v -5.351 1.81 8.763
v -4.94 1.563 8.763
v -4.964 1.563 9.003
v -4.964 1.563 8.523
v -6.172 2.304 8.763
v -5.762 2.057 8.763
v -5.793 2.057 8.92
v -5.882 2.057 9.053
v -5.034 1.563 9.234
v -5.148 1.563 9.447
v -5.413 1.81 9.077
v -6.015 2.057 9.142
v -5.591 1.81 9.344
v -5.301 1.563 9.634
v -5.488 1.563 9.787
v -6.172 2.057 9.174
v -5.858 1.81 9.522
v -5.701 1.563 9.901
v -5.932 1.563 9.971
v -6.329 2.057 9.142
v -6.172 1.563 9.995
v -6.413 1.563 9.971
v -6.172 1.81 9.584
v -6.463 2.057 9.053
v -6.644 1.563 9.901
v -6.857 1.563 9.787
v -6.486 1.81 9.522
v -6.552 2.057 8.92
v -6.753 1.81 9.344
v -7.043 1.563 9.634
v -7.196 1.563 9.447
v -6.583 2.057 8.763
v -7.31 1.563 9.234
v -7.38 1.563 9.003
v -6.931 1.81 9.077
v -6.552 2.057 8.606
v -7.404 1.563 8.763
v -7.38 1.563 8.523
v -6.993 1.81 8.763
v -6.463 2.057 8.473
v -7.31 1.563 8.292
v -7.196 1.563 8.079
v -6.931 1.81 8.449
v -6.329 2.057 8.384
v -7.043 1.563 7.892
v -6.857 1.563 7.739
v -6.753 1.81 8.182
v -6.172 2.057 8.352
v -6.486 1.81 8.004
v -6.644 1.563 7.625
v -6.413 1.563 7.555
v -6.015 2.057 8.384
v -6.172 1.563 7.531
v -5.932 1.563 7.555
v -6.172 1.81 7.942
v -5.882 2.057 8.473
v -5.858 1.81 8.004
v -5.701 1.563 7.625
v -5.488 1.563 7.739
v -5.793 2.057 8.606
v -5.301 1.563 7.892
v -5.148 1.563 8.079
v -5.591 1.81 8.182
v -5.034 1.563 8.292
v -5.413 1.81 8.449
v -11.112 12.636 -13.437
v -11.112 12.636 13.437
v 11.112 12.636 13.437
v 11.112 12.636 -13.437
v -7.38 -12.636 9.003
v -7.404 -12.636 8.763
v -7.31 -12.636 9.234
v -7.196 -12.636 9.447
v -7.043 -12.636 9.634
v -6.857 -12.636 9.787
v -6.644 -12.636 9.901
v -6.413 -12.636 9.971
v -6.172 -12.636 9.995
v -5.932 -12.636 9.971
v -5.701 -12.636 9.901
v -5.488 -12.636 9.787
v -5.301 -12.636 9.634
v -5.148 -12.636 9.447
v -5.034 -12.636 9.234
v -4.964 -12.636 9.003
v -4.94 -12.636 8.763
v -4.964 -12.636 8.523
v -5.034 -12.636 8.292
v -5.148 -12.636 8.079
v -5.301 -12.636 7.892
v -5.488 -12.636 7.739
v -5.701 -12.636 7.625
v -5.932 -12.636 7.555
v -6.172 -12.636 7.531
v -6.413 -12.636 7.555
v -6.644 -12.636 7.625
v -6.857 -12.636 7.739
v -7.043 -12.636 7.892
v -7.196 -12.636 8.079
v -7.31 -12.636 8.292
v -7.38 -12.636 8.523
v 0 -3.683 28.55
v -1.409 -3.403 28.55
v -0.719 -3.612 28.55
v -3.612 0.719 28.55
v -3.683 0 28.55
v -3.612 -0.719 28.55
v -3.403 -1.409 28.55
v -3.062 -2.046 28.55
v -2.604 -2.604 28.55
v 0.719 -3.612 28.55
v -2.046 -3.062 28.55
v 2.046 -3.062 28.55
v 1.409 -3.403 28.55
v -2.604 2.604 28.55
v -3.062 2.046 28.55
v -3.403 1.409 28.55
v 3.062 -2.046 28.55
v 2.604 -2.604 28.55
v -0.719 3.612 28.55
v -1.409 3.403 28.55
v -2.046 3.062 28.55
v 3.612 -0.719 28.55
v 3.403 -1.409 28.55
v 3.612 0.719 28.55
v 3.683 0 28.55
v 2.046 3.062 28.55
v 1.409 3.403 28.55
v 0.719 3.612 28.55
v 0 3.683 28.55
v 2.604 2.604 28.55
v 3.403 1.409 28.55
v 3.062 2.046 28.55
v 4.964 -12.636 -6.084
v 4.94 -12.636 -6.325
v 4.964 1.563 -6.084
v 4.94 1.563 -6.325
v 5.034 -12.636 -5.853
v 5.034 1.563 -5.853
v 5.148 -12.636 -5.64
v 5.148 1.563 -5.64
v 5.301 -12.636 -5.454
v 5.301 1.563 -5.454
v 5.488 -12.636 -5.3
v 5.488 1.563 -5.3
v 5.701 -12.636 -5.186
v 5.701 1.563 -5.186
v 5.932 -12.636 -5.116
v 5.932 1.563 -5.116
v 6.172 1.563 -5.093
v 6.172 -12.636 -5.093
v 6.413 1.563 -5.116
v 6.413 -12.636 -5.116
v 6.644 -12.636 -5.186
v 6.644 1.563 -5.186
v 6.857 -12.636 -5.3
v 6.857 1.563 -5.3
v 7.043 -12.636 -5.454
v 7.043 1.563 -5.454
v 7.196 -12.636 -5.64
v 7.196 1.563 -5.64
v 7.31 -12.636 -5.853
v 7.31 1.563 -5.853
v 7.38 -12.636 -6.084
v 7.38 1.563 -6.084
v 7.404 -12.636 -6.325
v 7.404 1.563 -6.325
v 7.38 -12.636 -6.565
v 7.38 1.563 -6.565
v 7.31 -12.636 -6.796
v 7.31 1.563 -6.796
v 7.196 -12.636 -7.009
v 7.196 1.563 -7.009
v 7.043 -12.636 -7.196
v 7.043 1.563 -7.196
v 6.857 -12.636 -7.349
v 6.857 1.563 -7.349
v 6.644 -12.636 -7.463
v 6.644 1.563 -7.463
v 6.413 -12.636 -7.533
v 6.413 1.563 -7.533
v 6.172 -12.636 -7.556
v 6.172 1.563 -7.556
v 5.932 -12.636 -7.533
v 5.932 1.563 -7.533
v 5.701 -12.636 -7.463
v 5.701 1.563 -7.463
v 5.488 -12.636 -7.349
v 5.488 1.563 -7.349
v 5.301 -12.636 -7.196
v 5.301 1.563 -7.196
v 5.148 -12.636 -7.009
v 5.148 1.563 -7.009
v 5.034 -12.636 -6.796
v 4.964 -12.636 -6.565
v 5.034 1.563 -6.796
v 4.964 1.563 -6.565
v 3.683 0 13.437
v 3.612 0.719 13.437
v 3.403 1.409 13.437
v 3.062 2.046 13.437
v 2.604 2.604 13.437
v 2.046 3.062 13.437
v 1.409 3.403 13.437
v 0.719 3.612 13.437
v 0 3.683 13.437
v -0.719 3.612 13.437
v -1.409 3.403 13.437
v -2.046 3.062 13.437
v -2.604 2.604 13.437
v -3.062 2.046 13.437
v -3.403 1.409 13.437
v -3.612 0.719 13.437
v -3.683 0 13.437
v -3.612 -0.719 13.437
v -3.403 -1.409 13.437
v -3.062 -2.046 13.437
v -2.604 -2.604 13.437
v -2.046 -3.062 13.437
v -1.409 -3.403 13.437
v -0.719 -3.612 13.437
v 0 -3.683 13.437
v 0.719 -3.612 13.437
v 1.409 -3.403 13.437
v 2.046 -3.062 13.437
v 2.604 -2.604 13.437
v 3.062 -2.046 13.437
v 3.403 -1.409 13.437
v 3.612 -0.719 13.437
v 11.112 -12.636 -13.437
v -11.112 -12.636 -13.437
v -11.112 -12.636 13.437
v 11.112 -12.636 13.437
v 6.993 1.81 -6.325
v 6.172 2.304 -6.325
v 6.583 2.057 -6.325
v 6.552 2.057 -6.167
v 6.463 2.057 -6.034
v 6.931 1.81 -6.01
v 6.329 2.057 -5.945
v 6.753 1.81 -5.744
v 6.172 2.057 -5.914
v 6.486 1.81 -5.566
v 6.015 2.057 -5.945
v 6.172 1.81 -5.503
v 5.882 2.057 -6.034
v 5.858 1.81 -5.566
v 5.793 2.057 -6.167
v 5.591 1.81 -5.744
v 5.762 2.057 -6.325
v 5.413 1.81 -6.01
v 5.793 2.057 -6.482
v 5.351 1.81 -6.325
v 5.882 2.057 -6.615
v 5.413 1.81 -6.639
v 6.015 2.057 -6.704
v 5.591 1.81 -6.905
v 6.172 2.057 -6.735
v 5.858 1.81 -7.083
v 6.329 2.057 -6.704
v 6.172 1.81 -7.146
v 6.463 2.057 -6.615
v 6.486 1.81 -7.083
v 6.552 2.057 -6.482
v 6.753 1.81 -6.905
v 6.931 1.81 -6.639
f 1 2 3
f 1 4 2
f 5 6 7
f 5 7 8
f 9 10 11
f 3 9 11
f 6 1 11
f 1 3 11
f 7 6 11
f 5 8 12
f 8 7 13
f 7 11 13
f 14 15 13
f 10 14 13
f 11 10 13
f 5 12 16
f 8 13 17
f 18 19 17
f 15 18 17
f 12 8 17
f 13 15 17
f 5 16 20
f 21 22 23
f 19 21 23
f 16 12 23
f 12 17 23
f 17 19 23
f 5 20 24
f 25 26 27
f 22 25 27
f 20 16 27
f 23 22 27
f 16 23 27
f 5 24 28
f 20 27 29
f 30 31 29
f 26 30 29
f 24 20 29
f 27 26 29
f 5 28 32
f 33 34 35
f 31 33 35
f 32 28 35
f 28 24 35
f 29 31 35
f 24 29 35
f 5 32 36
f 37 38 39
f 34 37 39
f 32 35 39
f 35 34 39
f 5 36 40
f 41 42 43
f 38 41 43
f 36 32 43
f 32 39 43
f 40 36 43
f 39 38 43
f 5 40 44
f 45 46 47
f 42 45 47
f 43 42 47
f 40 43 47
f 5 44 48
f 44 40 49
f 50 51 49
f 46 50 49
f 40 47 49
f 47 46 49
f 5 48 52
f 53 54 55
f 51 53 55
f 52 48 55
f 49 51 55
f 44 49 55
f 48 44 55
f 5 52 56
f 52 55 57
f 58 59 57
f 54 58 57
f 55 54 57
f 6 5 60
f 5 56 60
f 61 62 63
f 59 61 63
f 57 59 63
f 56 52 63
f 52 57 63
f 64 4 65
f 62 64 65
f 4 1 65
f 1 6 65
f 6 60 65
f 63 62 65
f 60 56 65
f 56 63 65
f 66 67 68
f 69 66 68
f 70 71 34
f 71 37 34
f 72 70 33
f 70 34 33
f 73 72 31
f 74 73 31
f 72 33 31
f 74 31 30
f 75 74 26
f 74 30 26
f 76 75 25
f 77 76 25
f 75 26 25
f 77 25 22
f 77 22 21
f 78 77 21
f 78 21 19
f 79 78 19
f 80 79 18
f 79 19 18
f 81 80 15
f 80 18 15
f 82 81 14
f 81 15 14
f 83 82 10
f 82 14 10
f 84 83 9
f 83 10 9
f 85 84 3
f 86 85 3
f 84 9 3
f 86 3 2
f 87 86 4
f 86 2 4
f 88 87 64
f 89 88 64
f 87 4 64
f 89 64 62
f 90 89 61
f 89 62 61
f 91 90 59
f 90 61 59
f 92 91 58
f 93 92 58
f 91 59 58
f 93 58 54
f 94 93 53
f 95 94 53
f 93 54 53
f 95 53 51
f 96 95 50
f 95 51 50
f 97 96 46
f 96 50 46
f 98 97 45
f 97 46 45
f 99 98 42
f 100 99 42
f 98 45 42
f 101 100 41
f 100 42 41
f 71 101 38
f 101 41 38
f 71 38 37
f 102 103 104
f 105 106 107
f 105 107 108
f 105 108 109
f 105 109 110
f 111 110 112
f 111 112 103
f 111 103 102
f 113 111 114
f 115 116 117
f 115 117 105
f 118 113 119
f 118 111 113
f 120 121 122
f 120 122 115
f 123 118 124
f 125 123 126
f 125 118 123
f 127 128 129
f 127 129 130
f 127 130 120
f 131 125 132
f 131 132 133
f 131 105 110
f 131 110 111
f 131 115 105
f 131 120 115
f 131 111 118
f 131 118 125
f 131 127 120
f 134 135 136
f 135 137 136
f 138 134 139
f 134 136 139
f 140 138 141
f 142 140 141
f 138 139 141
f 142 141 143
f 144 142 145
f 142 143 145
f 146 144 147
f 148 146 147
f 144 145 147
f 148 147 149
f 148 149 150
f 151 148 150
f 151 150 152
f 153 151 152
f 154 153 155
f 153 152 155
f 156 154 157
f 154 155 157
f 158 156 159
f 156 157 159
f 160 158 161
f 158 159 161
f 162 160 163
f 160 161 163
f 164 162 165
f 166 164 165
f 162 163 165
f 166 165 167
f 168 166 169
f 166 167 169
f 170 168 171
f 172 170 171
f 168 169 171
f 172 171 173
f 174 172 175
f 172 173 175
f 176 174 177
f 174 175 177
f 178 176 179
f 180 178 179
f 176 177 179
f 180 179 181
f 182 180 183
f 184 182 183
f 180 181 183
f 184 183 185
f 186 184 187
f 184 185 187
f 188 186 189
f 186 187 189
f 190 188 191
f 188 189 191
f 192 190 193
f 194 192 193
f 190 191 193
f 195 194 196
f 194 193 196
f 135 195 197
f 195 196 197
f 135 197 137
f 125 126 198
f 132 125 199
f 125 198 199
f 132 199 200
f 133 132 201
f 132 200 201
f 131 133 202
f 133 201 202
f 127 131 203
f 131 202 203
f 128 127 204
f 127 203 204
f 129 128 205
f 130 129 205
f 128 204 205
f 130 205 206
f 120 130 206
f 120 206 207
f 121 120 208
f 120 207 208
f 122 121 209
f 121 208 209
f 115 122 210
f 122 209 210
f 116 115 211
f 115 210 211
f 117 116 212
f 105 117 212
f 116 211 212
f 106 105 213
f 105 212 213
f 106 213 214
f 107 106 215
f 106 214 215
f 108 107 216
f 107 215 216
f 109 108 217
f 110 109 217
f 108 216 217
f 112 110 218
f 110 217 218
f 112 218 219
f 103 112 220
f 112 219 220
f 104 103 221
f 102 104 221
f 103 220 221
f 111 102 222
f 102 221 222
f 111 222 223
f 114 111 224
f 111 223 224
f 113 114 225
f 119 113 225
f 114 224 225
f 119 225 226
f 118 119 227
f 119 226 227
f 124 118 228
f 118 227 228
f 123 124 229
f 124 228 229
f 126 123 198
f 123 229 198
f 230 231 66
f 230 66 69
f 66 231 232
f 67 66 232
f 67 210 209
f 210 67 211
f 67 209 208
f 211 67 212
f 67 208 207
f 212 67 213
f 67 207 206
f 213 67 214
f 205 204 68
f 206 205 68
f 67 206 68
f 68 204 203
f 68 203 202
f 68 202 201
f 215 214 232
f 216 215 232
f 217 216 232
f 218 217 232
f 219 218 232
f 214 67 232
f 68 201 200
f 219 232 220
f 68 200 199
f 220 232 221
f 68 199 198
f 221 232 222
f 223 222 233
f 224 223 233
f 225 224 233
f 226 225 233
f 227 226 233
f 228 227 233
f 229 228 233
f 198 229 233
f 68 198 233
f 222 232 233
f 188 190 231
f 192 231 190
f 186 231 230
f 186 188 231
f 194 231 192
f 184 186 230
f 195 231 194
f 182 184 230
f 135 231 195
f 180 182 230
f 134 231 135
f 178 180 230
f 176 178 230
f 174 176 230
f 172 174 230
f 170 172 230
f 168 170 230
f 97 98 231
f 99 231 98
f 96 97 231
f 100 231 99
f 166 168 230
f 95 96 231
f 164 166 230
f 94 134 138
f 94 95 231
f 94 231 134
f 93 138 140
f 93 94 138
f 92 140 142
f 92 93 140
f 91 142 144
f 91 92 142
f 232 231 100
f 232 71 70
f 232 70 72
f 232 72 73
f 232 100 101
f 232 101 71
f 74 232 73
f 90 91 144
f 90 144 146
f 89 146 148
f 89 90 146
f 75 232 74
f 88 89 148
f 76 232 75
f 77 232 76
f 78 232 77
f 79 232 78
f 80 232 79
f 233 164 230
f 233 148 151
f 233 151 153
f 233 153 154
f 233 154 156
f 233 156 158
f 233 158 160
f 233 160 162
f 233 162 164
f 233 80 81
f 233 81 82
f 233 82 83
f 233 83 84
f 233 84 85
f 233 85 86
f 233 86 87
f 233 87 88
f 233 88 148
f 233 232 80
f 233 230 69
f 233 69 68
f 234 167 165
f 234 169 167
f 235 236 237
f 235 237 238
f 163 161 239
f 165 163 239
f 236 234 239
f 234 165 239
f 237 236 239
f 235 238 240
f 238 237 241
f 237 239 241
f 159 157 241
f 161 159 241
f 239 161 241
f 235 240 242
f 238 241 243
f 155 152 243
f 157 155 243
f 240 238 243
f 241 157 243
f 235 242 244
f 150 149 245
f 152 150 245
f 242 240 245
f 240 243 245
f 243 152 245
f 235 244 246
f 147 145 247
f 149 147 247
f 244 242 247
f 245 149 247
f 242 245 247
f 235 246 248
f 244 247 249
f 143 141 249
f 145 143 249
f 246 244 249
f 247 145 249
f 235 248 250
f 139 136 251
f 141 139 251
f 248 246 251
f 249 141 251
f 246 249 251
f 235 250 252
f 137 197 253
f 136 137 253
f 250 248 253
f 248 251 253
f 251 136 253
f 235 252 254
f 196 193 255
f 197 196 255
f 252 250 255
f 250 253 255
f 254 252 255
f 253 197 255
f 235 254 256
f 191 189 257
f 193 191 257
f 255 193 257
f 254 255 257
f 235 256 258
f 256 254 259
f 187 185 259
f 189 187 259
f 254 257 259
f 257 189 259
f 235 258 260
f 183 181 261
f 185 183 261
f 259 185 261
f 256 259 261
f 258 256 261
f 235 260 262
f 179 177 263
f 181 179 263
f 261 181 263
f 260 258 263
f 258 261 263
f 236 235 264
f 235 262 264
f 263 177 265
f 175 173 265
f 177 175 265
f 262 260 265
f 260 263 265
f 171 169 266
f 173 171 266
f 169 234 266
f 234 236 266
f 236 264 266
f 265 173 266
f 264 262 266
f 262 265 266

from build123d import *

# Parameters (mm, degrees)
F0_W     = 22.225
F0_H     = 26.8732
F1_DEPTH = 12.6365
F2_R     = 3.683
F3_DEPTH = 15.113
F5_D     = 2.4638
F5_DEPTH = 14.2
F5_TIP   = 0.7402001966


with BuildPart() as f1:
    # F0 (on Front) → F1 (new body, symmetric)
    with BuildSketch(Plane.XZ):
        Rectangle(F0_W, F0_H)
    extrude(amount=F1_DEPTH, both=True)

    # F2 (on face) → F3 (join)
    with BuildSketch(Plane.XY.offset(13.4366)):
        Circle(F2_R)
    extrude(amount=F3_DEPTH)

    # F5
    with Locations(Plane.XZ.offset(12.6365)):
        with Locations((-6.1722, 8.763), (6.1722, -6.3246)):
            Hole(F5_D / 2, depth=F5_DEPTH)
            with Locations((0, 0, -(F5_DEPTH + F5_TIP / 2))):  # 118° drill point
                Cone(0, F5_D / 2, F5_TIP, mode=Mode.SUBTRACT)


solid = f1.part
